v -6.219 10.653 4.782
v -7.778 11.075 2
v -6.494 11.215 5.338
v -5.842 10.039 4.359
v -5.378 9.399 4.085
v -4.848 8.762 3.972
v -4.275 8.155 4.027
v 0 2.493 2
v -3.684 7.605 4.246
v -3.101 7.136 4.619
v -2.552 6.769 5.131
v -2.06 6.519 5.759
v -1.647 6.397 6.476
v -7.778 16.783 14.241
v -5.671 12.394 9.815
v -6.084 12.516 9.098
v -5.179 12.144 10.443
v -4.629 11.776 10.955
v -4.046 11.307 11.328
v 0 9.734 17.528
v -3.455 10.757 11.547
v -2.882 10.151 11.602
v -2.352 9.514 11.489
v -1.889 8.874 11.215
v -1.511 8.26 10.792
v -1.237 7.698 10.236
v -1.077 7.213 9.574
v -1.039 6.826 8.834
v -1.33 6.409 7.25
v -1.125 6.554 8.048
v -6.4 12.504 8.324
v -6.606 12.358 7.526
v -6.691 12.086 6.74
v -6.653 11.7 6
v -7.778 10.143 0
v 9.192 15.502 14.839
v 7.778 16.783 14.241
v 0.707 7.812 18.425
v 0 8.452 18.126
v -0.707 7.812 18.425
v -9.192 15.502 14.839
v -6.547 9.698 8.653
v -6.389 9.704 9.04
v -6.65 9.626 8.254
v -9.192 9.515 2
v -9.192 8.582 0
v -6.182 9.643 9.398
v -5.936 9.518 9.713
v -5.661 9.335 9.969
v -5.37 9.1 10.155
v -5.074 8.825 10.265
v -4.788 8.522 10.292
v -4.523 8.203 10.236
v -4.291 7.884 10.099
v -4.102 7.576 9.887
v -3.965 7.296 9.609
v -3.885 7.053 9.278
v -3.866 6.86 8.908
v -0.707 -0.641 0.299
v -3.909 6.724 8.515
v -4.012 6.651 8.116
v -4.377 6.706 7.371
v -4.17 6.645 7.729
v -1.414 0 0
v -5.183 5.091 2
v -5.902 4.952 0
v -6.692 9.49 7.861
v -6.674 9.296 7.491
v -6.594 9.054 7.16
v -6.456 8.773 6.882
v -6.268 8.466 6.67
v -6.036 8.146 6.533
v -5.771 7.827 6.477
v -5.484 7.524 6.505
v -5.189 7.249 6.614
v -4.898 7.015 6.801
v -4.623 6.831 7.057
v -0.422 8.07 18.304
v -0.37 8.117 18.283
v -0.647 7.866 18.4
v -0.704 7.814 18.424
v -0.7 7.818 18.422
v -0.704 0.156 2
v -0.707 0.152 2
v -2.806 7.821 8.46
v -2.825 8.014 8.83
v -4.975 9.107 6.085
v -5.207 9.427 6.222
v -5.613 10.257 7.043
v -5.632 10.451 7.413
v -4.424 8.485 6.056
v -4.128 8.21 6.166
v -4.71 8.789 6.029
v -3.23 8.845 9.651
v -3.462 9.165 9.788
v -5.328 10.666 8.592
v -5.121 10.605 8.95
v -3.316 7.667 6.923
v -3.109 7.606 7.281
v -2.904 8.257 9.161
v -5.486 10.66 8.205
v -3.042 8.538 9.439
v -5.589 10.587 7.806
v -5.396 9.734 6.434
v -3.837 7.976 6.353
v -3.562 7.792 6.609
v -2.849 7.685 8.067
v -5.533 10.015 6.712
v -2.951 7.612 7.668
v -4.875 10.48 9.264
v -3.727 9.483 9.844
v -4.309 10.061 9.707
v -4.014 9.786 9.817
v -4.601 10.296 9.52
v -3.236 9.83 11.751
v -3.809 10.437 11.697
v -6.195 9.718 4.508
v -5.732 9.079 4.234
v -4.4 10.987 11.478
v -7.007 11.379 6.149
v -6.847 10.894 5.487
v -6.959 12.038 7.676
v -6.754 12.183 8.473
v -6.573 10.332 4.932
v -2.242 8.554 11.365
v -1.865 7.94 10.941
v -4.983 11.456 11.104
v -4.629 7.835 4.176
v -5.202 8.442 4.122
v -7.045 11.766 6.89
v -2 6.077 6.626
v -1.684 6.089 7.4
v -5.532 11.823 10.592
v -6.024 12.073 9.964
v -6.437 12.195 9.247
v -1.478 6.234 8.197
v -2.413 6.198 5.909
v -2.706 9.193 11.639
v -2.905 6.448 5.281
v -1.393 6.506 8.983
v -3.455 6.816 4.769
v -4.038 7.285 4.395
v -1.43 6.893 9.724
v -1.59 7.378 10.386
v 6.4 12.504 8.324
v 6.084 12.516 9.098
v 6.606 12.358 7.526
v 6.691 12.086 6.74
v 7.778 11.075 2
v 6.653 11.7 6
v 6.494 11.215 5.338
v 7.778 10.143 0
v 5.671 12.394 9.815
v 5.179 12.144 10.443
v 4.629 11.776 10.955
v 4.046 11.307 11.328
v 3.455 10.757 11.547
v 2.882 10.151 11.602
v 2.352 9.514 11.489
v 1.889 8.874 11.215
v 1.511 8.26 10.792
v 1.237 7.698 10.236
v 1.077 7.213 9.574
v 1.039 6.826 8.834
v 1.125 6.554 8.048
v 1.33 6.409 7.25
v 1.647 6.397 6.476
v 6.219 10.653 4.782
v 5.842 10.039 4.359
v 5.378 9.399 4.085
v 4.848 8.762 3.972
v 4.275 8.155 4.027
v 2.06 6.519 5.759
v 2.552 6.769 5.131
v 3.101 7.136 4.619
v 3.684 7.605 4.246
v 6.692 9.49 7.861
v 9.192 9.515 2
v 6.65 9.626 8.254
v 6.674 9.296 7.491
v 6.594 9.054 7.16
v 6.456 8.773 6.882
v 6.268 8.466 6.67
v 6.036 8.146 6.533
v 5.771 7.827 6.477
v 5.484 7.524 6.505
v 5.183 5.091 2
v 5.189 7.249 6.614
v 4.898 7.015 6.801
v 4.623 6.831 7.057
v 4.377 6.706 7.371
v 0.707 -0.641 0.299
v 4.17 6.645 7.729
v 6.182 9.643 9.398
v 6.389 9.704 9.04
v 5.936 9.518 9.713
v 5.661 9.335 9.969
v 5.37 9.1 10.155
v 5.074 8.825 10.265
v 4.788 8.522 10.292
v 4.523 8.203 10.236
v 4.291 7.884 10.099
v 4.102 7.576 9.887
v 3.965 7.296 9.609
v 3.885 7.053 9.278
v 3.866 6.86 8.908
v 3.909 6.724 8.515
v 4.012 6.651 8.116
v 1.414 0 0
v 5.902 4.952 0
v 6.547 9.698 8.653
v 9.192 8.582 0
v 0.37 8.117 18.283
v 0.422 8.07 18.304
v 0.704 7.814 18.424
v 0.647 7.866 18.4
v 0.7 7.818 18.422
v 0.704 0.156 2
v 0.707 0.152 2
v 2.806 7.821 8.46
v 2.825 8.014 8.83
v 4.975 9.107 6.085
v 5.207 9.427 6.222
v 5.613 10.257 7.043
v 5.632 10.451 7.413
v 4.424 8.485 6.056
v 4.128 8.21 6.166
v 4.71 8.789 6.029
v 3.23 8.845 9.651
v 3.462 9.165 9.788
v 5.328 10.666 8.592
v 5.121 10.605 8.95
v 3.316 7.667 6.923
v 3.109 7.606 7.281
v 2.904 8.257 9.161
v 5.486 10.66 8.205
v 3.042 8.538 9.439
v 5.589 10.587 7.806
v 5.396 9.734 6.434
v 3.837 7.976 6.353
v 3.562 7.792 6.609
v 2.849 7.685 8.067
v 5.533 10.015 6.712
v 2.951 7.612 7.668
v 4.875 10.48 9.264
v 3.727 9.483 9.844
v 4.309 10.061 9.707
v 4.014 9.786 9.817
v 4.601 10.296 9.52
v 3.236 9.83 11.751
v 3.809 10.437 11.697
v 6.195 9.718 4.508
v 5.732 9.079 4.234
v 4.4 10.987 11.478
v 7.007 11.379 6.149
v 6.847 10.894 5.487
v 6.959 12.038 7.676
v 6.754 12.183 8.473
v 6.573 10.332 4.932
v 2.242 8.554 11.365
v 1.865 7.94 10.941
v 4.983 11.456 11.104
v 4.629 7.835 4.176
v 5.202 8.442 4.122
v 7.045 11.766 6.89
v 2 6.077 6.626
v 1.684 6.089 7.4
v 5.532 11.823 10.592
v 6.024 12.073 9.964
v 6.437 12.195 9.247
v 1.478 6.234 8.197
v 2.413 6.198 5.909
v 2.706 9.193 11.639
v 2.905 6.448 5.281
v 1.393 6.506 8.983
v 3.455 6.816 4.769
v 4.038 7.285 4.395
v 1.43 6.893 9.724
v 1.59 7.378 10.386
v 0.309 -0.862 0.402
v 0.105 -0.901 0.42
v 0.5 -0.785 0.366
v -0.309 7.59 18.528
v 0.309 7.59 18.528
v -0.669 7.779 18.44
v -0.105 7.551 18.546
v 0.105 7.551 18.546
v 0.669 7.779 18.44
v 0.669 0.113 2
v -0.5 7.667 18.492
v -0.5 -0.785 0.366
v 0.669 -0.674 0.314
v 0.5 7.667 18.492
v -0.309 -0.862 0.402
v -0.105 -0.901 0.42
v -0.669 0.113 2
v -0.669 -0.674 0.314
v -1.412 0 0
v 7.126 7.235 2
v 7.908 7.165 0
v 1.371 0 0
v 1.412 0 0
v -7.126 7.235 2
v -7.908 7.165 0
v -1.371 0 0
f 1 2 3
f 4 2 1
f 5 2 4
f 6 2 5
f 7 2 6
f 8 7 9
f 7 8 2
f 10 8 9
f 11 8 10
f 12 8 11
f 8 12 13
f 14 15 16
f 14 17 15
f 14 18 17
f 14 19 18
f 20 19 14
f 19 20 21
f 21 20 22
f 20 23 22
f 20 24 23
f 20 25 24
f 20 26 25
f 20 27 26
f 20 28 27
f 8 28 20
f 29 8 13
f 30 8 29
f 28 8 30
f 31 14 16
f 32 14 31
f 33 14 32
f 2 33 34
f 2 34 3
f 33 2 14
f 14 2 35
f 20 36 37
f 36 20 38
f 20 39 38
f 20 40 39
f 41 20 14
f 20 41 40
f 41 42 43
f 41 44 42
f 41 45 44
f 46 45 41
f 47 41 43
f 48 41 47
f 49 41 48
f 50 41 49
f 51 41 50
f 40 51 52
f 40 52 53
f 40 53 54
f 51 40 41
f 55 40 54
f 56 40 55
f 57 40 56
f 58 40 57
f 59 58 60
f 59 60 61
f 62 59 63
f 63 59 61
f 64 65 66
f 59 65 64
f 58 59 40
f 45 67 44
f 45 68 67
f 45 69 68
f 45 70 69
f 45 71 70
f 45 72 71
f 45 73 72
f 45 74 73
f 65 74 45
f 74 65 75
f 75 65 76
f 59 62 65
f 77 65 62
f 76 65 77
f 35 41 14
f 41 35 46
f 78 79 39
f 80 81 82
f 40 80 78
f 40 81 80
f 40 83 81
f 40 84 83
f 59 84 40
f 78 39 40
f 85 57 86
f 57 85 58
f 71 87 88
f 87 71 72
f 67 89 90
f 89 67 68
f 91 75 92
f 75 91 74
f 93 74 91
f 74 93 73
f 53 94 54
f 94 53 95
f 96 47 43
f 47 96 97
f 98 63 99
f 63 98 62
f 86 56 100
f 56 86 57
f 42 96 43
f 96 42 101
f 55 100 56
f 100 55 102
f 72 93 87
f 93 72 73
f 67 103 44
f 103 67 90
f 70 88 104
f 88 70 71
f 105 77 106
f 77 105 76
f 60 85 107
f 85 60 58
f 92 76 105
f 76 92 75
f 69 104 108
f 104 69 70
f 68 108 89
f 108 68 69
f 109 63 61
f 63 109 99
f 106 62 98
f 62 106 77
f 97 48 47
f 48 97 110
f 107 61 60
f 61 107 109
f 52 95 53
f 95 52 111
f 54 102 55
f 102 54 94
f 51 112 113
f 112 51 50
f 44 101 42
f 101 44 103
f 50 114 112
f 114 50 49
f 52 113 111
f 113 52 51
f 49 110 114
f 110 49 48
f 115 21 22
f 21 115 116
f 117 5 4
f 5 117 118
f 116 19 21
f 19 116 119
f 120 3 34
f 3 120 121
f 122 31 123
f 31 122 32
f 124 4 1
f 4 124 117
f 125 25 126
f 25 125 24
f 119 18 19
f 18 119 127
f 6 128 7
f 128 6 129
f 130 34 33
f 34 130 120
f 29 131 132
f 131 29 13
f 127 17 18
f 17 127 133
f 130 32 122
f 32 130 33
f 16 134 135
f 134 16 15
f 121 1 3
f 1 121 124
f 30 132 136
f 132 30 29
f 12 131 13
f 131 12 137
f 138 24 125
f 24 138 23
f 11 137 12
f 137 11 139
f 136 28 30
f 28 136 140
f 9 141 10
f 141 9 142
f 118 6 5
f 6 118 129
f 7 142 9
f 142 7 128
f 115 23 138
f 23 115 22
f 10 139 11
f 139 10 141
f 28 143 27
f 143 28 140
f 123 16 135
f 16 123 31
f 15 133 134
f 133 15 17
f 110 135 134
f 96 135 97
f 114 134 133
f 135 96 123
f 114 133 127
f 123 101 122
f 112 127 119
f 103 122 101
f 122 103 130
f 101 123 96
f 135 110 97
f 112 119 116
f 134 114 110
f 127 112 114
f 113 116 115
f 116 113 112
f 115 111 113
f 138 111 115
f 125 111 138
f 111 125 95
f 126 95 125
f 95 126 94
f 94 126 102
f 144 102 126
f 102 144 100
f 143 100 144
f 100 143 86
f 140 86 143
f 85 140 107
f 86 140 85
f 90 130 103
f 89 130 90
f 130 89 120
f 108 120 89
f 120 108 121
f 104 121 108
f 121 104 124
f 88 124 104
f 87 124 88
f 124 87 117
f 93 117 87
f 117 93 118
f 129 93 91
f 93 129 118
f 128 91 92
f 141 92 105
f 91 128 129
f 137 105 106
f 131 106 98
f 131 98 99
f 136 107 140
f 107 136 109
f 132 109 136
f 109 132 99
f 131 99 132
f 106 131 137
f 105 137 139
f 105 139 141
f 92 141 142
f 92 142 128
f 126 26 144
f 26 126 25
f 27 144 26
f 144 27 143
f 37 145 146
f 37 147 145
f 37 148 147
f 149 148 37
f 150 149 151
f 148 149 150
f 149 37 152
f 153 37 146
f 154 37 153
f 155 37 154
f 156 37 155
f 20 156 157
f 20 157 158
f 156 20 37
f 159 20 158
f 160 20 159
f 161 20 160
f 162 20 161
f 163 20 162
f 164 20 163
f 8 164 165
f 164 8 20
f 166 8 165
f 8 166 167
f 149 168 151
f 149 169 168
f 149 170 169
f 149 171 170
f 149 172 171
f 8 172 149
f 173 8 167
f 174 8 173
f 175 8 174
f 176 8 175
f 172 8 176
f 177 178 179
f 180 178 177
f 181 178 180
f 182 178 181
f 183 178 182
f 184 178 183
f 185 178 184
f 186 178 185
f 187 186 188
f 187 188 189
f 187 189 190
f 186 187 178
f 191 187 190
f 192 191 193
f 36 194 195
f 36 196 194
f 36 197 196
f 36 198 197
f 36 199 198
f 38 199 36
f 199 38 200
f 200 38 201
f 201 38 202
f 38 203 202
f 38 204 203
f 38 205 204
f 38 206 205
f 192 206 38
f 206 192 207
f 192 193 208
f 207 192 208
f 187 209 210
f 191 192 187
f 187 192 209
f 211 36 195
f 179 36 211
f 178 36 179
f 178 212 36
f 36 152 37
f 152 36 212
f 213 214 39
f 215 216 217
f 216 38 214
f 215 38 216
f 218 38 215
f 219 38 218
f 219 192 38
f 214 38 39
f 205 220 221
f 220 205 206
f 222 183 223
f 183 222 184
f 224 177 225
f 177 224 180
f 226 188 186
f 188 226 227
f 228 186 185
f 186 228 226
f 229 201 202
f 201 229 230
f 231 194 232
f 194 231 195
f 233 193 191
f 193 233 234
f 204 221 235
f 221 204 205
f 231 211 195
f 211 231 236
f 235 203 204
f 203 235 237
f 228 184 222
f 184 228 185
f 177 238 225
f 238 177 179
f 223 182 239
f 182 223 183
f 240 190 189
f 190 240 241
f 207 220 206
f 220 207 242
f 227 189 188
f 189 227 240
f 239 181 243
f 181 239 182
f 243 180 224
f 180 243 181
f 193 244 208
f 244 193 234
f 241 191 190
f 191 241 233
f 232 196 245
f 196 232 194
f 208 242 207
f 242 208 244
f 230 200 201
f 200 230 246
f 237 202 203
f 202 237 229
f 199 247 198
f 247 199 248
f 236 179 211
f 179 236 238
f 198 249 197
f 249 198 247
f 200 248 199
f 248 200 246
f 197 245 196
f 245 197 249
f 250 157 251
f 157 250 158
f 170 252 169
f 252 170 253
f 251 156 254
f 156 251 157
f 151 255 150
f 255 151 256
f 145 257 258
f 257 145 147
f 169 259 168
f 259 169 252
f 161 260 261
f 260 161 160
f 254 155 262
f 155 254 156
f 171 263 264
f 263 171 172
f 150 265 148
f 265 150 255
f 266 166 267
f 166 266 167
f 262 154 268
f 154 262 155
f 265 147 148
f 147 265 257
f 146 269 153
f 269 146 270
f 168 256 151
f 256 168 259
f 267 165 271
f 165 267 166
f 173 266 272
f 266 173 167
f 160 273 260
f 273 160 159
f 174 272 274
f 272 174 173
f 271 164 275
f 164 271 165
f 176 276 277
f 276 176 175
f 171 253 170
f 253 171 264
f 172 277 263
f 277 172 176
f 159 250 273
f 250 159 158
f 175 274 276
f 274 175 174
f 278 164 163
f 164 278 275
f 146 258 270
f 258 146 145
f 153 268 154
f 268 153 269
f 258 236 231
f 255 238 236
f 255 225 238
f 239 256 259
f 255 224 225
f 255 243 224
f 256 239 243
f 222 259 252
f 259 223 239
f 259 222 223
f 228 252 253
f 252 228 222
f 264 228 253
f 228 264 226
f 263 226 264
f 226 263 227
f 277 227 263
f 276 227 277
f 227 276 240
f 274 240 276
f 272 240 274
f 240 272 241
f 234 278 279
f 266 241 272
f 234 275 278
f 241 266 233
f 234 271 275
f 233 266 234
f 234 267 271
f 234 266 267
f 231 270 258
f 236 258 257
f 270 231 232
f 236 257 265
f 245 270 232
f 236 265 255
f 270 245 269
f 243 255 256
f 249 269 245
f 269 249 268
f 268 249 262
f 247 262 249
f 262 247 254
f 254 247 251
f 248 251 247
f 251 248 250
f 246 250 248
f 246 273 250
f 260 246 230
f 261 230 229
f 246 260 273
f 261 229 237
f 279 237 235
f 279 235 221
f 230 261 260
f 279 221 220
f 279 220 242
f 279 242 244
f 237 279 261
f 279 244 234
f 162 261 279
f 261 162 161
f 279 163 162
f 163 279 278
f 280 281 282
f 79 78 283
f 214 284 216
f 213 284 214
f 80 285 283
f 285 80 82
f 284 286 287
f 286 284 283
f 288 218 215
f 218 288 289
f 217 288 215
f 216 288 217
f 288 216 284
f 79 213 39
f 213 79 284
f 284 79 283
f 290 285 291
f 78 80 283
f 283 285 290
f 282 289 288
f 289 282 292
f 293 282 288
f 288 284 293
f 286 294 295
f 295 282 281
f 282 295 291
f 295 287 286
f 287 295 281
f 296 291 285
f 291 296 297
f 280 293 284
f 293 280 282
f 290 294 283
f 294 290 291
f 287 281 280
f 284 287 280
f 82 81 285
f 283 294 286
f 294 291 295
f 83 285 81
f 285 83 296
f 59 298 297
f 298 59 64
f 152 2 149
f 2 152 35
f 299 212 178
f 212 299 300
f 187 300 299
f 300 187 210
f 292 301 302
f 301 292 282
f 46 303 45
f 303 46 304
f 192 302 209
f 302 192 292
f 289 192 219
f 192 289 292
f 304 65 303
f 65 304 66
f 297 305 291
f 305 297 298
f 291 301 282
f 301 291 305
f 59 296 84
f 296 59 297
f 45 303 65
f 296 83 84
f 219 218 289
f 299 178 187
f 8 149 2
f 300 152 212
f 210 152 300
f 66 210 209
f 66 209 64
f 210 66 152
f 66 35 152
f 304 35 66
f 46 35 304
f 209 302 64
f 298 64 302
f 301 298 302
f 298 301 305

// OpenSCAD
//Horizontal angle
angle_1 = 90;

//Vertical angle
angle_2 = 25;

//Height of the bracket
height = 20;

//Width of the bracket
width = 12;

//Thickness
thickness = 2;

//The diameter of the mounting hole
mount_d = 4;

module plane()
{
    rotate([-angle_2,0,0])
    rotate([0,0,angle_1/2])
    translate([-thickness/2,0,0])
    difference()
    {
        cube([thickness,width,height]);
        
        rotate([angle_2/3,0,0])
        translate([-thickness*2,width - mount_d, height/2])
        rotate([0,90,0])
        cylinder(r=mount_d/2,h=4*thickness, $fn=30);

        rotate([angle_2/3,0,0])
        translate([thickness-0.5,width - mount_d, height/2])
        rotate([0,90,0])
        cylinder(r=mount_d,h=thickness, $fn=30);
    }
}

module holder(height)
{
    union()
    {
        plane();

        mirror([1,0,0])
        plane();
        
        rotate([-angle_2,0,0])
        cylinder(r=thickness/2,h=height, $fn=30);
    }
}

difference()
{
    union()
    {
        holder(height);
        difference()
        {
            hull()
            {
                holder(height);
            }
            translate([-width,0,thickness])
            cube([width*2,width*2,height]);
        }
    }
    
    translate([-width,0,-height])
    cube([width*2,width*2,height]);
}
